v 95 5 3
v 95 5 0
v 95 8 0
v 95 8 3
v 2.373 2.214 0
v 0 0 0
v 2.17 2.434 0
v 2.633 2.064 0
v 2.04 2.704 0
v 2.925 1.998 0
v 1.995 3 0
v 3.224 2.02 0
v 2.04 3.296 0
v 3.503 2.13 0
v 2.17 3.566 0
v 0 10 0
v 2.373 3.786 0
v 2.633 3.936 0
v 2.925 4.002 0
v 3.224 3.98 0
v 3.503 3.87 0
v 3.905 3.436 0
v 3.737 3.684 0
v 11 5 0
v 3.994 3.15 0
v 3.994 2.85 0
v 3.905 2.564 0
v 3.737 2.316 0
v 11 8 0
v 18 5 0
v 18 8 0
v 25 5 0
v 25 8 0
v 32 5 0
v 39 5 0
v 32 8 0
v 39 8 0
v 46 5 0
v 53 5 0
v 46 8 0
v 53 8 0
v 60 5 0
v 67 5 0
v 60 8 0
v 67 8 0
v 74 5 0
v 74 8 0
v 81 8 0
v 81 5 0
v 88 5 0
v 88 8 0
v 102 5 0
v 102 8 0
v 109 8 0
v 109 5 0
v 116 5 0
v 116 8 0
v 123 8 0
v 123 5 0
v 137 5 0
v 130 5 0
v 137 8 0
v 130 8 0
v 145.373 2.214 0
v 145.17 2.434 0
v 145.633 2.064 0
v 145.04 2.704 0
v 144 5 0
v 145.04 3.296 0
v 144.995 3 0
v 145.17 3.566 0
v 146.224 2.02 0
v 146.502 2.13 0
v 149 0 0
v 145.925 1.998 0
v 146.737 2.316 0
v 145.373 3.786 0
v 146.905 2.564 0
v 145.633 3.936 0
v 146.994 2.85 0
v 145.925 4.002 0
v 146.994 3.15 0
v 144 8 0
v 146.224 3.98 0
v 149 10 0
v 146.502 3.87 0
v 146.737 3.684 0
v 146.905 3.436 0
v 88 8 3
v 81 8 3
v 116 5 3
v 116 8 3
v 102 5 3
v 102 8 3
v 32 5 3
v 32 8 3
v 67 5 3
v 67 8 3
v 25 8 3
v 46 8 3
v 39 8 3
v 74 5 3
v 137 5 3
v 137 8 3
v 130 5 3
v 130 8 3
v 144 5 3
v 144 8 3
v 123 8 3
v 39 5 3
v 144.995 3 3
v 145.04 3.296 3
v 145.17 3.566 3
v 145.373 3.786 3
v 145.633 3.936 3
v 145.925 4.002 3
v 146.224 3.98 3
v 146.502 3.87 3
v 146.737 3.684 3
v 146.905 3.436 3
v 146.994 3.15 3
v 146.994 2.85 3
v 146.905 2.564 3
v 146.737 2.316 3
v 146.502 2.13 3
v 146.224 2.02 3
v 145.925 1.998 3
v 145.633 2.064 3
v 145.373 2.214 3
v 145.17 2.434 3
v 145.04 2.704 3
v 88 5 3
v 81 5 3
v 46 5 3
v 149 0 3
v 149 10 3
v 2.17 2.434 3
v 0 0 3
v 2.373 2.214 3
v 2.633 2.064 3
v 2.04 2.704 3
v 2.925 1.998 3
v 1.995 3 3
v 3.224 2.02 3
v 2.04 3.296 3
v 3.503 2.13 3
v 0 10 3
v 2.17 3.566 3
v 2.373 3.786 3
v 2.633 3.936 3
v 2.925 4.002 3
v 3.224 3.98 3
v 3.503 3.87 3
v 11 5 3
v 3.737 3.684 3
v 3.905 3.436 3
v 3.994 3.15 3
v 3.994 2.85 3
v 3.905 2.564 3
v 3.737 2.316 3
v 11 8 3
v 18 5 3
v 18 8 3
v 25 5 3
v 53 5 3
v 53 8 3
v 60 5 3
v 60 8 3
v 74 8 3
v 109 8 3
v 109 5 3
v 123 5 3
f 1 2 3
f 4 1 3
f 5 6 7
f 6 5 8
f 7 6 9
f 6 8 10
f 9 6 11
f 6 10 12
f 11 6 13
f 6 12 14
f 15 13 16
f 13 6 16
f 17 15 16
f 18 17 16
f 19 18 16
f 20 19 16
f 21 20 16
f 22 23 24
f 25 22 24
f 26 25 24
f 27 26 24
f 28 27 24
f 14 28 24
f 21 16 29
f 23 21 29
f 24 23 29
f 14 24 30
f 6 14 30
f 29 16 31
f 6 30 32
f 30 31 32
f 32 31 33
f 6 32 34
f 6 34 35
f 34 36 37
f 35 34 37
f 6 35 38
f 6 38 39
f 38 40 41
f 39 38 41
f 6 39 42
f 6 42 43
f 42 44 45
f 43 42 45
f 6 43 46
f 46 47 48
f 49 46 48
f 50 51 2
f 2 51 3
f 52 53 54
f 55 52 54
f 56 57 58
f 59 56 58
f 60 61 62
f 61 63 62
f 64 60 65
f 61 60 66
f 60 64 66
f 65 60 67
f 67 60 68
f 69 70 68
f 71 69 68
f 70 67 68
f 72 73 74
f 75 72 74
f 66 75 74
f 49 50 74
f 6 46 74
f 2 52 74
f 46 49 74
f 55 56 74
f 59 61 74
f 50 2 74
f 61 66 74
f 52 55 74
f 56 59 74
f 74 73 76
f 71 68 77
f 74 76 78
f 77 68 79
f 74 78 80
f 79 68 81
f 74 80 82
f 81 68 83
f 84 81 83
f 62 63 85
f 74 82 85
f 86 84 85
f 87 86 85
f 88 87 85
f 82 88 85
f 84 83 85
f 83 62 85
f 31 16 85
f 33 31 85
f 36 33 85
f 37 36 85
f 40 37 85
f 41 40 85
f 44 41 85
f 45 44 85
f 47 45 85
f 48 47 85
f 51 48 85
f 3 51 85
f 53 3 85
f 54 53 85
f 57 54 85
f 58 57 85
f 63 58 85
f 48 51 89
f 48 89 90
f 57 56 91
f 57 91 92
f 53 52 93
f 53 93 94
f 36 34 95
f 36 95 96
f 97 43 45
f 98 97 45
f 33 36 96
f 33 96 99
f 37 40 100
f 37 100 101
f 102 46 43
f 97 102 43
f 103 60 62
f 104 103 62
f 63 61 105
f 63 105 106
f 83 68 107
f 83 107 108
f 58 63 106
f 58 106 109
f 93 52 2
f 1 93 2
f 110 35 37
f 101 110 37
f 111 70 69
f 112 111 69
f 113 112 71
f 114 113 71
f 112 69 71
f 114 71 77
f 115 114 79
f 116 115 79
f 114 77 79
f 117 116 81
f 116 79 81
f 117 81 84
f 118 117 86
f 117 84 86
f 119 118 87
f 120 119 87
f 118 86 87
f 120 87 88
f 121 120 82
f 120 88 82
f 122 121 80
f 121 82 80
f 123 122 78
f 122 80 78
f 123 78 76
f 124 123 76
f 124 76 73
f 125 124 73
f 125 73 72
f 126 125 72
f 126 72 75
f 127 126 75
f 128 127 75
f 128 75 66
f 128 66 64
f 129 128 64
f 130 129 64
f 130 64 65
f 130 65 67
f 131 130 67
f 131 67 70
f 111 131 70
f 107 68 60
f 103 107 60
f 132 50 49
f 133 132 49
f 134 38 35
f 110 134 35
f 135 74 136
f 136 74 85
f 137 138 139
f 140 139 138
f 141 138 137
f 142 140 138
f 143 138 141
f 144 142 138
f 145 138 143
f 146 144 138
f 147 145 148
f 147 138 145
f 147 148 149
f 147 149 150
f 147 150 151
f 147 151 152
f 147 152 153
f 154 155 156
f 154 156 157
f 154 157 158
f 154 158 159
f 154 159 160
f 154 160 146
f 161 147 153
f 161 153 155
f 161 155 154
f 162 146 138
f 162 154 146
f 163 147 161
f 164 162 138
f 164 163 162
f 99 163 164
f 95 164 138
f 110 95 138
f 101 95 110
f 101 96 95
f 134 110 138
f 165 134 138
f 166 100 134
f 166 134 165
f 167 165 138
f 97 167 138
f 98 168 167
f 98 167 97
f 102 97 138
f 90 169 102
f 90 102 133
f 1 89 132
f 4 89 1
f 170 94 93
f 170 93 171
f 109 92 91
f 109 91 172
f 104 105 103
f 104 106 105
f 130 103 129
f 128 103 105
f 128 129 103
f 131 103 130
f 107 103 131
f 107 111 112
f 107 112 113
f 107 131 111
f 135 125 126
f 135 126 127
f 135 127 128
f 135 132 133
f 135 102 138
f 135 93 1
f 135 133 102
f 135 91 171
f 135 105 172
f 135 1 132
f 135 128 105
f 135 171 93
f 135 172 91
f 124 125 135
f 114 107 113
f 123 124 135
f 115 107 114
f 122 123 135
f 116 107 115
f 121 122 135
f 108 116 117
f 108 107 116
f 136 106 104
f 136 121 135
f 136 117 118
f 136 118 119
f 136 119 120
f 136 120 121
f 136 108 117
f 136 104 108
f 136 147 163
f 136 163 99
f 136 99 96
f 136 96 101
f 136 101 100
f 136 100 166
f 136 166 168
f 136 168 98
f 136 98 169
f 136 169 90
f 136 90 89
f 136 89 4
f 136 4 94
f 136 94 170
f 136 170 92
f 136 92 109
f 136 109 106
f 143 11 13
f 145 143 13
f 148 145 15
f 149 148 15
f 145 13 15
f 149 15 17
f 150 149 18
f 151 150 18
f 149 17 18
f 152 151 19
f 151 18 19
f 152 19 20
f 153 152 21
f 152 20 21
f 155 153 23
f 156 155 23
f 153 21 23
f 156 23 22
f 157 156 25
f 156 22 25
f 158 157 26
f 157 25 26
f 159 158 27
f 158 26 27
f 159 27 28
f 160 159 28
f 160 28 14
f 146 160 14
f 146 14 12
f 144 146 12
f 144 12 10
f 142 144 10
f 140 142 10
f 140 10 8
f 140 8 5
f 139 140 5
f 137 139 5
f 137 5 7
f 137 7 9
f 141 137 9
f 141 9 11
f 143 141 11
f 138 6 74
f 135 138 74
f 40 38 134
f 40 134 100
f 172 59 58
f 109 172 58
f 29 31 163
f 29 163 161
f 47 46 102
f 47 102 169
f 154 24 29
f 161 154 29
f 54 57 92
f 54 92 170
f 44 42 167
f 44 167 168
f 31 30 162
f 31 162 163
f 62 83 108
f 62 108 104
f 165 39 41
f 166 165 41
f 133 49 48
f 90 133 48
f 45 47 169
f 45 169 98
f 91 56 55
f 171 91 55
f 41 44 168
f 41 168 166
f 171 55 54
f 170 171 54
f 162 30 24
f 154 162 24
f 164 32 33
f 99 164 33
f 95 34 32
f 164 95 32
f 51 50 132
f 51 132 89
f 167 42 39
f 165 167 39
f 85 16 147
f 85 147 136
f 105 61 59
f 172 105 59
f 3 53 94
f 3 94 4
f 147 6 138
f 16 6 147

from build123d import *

# Parameters (mm, degrees)
ESQUISSE1_W             = 149
ESQUISSE1_H             = 10
BOSS_EXTRU_1_DEPTH      = 3
ESQUISSE2_R             = 1.005
ESQUISSE2_W             = 7
ESQUISSE2_H             = 3
ENL_V_MAT_EXTRU_1_DEPTH = 150.365323954


with BuildPart() as part:
    # Esquisse1 → Boss.-Extru.1 (new body)
    with BuildSketch(Plane.XY):
        with Locations((74.5, 5)):
            Rectangle(ESQUISSE1_W, ESQUISSE1_H)
    extrude(amount=BOSS_EXTRU_1_DEPTH)

    # Esquisse2 → Enlèv. mat.-Extru.1 (cut, through all)
    with BuildSketch(Plane(origin=(0, 0, 0), x_dir=(-1, 0, 0), z_dir=(0, 0, -1))):
        with Locations((-3, 3)):
            Circle(ESQUISSE2_R)
        with Locations((-146, 3)):
            Circle(ESQUISSE2_R)
        with Locations((-140.5, 6.5)):
            Rectangle(ESQUISSE2_W, ESQUISSE2_H)
        with Locations((-126.5, 6.5)):
            Rectangle(ESQUISSE2_W, ESQUISSE2_H)
        with Locations((-112.5, 6.5)):
            Rectangle(ESQUISSE2_W, ESQUISSE2_H)
        with Locations((-98.5, 6.5)):
            Rectangle(ESQUISSE2_W, ESQUISSE2_H)
        with Locations((-84.5, 6.5)):
            Rectangle(ESQUISSE2_W, ESQUISSE2_H)
        with Locations((-70.5, 6.5)):
            Rectangle(ESQUISSE2_W, ESQUISSE2_H)
        with Locations((-56.5, 6.5)):
            Rectangle(ESQUISSE2_W, ESQUISSE2_H)
        with Locations((-42.5, 6.5)):
            Rectangle(ESQUISSE2_W, ESQUISSE2_H)
        with Locations((-28.5, 6.5)):
            Rectangle(ESQUISSE2_W, ESQUISSE2_H)
        with Locations((-14.5, 6.5)):
            Rectangle(ESQUISSE2_W, ESQUISSE2_H)
    extrude(amount=-ENL_V_MAT_EXTRU_1_DEPTH, mode=Mode.SUBTRACT)


solid = part.part
